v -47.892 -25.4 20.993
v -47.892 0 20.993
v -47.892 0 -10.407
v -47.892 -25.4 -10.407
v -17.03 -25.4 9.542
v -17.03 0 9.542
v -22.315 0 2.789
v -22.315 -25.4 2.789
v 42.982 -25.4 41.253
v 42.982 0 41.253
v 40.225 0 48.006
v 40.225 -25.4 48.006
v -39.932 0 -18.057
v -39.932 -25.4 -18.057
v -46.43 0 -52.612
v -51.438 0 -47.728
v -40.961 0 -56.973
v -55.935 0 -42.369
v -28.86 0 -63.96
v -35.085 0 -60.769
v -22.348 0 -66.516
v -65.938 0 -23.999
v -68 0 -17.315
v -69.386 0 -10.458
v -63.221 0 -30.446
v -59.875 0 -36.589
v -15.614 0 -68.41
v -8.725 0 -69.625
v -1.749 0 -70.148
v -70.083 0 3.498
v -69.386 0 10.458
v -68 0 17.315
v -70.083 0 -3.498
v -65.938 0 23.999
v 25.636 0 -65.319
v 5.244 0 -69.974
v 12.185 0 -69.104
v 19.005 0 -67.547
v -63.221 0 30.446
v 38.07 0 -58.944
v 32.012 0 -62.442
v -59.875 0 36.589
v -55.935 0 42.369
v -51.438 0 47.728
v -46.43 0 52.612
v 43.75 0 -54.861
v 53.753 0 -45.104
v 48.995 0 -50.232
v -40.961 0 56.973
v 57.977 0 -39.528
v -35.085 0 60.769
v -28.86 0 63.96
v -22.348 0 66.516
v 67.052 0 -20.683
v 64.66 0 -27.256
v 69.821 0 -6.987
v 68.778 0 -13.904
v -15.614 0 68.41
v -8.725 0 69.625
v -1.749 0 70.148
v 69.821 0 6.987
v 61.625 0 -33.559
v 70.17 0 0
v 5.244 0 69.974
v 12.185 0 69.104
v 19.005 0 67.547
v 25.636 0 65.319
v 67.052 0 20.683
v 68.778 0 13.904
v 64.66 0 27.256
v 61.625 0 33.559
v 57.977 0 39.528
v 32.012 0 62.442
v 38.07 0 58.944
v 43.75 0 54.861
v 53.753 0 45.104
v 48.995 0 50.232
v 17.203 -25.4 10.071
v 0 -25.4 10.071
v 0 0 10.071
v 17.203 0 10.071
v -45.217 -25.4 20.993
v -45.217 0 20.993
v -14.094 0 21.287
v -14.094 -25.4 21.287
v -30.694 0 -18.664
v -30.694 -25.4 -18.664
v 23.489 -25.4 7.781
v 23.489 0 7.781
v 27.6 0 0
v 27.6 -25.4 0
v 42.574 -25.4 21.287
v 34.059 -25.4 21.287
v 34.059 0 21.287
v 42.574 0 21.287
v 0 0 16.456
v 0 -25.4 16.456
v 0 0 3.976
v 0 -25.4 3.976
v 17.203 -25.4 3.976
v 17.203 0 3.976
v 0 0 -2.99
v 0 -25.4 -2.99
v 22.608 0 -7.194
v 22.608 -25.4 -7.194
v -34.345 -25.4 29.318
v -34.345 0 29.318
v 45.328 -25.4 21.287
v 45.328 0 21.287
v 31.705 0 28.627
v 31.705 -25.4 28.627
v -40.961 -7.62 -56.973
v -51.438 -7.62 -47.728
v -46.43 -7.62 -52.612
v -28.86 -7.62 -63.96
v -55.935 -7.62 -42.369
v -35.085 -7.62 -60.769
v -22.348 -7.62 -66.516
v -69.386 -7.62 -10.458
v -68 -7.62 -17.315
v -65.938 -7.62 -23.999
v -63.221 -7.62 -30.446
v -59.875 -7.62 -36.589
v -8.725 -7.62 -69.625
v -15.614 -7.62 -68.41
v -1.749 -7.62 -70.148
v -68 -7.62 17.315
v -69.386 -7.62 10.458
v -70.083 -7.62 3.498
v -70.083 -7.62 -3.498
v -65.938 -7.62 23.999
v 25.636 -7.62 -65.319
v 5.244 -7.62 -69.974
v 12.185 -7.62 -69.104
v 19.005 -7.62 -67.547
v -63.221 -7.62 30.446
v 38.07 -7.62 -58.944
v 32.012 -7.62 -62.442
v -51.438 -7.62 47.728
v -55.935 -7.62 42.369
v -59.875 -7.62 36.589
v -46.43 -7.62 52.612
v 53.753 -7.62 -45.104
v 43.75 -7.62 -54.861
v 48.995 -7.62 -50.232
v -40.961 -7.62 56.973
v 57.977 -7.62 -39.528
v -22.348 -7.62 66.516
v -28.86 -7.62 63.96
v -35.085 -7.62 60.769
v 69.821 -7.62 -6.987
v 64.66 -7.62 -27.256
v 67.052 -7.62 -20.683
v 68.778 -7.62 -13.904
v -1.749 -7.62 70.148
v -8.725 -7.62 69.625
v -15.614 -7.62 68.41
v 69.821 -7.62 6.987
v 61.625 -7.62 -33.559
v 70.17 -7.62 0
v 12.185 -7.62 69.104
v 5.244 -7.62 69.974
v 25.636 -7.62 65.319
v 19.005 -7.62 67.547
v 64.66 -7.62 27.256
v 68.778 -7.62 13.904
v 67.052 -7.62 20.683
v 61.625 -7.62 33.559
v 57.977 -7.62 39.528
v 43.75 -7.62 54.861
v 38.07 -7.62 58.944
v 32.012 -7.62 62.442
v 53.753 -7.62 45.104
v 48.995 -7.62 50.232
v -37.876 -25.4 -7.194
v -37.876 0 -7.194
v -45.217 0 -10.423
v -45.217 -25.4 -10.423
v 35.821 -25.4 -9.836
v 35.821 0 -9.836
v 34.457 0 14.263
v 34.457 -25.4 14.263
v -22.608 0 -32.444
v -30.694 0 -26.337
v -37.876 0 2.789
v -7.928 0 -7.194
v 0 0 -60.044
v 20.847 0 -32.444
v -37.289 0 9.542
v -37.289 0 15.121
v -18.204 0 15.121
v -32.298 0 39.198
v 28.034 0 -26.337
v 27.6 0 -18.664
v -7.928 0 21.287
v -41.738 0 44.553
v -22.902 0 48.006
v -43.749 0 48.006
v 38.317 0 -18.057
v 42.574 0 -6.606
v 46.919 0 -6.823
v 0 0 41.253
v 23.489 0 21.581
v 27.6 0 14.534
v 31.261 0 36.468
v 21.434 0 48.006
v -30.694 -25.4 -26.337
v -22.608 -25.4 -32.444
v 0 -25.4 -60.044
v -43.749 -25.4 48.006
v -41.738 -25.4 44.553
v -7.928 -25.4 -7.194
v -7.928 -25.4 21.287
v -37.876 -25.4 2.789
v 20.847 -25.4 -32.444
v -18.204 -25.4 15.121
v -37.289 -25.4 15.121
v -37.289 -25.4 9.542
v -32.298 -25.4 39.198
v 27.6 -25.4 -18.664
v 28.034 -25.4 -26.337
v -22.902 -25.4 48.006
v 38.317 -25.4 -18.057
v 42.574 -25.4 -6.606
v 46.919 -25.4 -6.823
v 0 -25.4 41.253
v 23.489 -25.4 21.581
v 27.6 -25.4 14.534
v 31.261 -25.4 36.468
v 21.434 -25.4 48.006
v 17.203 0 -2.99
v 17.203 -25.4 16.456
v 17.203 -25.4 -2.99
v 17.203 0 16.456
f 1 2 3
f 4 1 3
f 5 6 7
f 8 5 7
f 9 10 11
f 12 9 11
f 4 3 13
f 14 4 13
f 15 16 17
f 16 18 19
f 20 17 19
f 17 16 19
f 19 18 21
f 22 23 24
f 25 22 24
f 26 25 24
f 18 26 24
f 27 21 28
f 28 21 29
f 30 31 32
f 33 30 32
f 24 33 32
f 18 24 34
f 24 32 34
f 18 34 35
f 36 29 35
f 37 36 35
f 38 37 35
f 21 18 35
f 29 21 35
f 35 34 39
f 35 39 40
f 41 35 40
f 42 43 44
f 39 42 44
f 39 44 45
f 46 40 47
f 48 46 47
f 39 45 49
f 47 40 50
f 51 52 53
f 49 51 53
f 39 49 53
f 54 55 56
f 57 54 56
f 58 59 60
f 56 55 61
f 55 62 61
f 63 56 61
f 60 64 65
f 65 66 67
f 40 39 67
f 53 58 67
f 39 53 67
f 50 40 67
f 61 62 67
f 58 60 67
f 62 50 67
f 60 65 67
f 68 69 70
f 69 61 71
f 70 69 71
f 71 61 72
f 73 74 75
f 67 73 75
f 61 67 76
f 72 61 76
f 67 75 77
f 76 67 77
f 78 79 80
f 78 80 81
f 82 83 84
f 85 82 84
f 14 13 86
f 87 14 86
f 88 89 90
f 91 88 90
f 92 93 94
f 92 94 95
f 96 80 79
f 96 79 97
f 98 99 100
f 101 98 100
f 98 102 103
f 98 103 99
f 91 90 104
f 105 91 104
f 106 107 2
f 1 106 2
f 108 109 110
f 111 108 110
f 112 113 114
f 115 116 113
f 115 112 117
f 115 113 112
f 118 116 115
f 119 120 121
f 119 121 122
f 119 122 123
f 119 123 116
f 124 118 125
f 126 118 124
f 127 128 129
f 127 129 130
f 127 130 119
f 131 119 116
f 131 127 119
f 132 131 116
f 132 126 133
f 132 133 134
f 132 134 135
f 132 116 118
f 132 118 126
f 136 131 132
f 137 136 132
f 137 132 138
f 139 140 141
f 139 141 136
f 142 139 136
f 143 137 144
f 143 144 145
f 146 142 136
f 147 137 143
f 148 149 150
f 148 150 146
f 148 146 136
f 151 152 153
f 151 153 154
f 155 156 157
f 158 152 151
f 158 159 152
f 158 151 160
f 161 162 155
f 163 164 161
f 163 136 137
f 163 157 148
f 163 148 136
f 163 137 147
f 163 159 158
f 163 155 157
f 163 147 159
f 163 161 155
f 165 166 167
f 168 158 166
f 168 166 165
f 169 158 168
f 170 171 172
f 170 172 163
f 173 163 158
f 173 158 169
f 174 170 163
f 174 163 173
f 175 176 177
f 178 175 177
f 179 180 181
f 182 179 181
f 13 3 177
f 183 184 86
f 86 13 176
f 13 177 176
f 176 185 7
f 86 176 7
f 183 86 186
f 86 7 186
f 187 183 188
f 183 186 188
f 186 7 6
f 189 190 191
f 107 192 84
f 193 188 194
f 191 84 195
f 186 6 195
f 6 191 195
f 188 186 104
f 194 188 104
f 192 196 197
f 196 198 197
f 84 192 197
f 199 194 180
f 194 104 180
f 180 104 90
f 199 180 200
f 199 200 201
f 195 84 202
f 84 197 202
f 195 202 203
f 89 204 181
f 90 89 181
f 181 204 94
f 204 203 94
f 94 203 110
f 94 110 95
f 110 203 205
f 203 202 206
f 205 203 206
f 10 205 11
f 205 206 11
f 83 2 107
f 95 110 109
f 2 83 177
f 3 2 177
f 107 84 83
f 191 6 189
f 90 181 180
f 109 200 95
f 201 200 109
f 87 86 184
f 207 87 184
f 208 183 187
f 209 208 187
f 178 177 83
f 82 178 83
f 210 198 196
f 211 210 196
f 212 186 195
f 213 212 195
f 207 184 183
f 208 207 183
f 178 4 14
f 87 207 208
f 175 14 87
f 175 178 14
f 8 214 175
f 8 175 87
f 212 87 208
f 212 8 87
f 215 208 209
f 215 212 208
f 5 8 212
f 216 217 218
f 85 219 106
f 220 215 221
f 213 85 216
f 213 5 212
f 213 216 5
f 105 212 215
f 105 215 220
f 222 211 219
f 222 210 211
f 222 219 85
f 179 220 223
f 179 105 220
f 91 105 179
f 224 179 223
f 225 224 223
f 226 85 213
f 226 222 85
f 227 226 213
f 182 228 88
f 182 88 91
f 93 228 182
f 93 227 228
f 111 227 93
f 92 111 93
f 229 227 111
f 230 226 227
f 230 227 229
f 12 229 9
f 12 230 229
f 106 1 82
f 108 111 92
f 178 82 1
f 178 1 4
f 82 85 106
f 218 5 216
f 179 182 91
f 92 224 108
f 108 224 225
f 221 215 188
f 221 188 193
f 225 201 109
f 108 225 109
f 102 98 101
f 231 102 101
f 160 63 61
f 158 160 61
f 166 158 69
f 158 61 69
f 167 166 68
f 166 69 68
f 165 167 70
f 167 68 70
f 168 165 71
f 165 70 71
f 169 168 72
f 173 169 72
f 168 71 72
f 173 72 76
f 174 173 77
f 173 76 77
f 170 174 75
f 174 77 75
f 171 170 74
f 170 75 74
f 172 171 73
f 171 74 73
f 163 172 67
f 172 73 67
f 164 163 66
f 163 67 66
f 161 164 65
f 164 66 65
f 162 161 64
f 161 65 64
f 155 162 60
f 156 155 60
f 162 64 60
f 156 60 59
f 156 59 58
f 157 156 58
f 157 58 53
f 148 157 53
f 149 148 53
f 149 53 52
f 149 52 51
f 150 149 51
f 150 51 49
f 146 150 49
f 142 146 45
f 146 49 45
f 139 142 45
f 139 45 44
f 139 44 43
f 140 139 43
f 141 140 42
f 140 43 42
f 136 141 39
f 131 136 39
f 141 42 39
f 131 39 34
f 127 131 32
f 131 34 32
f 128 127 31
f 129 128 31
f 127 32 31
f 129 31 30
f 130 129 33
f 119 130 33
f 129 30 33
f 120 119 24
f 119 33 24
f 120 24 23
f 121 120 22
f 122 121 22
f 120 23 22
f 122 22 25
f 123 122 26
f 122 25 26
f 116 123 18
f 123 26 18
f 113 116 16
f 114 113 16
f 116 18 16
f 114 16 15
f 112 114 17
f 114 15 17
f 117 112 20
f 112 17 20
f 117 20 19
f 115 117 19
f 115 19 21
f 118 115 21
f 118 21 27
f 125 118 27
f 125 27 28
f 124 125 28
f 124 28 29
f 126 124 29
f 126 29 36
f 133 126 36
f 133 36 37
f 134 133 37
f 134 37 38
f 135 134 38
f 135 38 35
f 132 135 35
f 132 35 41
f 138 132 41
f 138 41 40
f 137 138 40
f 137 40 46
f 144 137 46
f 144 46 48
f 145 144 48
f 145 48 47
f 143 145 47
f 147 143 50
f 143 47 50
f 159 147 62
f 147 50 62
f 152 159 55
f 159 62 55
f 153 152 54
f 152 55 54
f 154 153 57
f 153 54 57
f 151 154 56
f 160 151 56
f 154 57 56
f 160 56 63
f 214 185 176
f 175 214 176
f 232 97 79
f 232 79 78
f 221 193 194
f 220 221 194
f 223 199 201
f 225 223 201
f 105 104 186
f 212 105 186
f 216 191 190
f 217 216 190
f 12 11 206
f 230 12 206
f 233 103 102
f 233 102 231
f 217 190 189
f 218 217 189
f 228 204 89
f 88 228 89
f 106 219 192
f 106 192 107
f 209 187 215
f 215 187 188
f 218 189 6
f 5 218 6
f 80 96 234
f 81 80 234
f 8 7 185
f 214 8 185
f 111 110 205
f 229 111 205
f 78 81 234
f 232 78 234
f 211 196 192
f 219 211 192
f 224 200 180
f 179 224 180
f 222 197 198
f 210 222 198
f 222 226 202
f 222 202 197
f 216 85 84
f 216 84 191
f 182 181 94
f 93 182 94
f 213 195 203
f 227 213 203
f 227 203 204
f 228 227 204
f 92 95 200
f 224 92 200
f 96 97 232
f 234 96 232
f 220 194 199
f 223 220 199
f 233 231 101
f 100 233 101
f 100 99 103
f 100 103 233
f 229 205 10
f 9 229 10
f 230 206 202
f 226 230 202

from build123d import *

# Parameters (mm, degrees)
F1_DEPTH = 25.4
F2_W     = 17.202688
F2_H     = 6.38533
F2_H_2   = 6.965813
F3_DEPTH = 25.4
F4_R     = 70.169766
F5_DEPTH = 7.62


with BuildPart() as f1:
    # F0 (on Front) → F1 (new body)
    with BuildSketch(Plane.XZ):
        Polygon((-41.738379, 44.55284), (-32.297615, 39.19756), (-16.148807, 40.111645), (-9.534805, 35.702311), (0, 41.252863), (-22.901945, 48.006002), (-43.748587, 48.006002), align=None)
        Polygon((21.433871, 48.006002), (0, 41.252863), (4.123883, 34.168806), (16.442424, 39.19756), (31.0597, 40.024954), (31.261035, 36.468045), (42.982022, 41.252863), (40.225212, 48.006002), align=None)
        Polygon((-16.148807, 40.111645), (-32.297615, 39.19756), (-34.344808, 29.317717), (-47.89209, 20.993449), (-47.89209, -10.406893), (-39.931595, -18.057304), (-30.694175, -18.663923), (-30.694175, -26.337028), (-22.60833, -32.444421), (0, -60.044203), (20.846643, -32.444421), (28.034105, -26.337028), (27.599778, -18.663923), (38.316717, -18.057304), (46.919027, -6.822597), (45.327913, 21.287065), (31.704862, 28.627119), (31.261035, 36.468045), (31.0597, 40.024954), (16.442424, 39.19756), (4.123883, 34.168806), (-2.920803, 31.292978), (-9.534805, 35.702311), align=None)
        Polygon((-45.216661, 20.993449), (-14.093505, 21.287065), (-18.20411, 15.121156), (-37.289064, 15.121156), (-37.289064, 9.542477), (-17.029652, 9.542477), (-22.314716, 2.789339), (-32.297615, 2.789339), (-37.876293, 2.789339), (-37.876293, -7.19356), (-45.216661, -10.423321), (-45.216661, 19.489946), align=None, mode=Mode.SUBTRACT)
        Polygon((-7.927598, 7.780789), (-7.927598, 21.287065), (23.489174, 21.580677), (27.599778, 14.533926), (23.489174, 7.780789), (27.599778, 0), (22.60833, -7.19356), (-7.927598, -7.19356), align=None, mode=Mode.SUBTRACT)
        Polygon((35.820995, -9.836092), (34.456904, 14.262817), (34.059305, 21.287065), (42.57413, 21.287065), (42.57413, -6.606331), align=None, mode=Mode.SUBTRACT)
        Polygon((0, 41.252863), (-9.534805, 35.702311), (-2.920803, 31.292978), (4.123883, 34.168806), align=None)
    extrude(amount=F1_DEPTH)


with BuildPart() as f3:
    # F2 (on Front) → F3 (new body)
    with BuildSketch(Plane.XZ):
        with Locations((8.601344, 13.263505)):
            Rectangle(F2_W, F2_H)
        with Locations((8.601344, 0.492846)):
            Rectangle(F2_W, F2_H_2)
    extrude(amount=F3_DEPTH)


with BuildPart() as f5:
    # F4 (on Front) → F5 (new body)
    with BuildSketch(Plane.XZ):
        Circle(F4_R)
    extrude(amount=F5_DEPTH)


solid = Compound([f1.part, f3.part, f5.part])
